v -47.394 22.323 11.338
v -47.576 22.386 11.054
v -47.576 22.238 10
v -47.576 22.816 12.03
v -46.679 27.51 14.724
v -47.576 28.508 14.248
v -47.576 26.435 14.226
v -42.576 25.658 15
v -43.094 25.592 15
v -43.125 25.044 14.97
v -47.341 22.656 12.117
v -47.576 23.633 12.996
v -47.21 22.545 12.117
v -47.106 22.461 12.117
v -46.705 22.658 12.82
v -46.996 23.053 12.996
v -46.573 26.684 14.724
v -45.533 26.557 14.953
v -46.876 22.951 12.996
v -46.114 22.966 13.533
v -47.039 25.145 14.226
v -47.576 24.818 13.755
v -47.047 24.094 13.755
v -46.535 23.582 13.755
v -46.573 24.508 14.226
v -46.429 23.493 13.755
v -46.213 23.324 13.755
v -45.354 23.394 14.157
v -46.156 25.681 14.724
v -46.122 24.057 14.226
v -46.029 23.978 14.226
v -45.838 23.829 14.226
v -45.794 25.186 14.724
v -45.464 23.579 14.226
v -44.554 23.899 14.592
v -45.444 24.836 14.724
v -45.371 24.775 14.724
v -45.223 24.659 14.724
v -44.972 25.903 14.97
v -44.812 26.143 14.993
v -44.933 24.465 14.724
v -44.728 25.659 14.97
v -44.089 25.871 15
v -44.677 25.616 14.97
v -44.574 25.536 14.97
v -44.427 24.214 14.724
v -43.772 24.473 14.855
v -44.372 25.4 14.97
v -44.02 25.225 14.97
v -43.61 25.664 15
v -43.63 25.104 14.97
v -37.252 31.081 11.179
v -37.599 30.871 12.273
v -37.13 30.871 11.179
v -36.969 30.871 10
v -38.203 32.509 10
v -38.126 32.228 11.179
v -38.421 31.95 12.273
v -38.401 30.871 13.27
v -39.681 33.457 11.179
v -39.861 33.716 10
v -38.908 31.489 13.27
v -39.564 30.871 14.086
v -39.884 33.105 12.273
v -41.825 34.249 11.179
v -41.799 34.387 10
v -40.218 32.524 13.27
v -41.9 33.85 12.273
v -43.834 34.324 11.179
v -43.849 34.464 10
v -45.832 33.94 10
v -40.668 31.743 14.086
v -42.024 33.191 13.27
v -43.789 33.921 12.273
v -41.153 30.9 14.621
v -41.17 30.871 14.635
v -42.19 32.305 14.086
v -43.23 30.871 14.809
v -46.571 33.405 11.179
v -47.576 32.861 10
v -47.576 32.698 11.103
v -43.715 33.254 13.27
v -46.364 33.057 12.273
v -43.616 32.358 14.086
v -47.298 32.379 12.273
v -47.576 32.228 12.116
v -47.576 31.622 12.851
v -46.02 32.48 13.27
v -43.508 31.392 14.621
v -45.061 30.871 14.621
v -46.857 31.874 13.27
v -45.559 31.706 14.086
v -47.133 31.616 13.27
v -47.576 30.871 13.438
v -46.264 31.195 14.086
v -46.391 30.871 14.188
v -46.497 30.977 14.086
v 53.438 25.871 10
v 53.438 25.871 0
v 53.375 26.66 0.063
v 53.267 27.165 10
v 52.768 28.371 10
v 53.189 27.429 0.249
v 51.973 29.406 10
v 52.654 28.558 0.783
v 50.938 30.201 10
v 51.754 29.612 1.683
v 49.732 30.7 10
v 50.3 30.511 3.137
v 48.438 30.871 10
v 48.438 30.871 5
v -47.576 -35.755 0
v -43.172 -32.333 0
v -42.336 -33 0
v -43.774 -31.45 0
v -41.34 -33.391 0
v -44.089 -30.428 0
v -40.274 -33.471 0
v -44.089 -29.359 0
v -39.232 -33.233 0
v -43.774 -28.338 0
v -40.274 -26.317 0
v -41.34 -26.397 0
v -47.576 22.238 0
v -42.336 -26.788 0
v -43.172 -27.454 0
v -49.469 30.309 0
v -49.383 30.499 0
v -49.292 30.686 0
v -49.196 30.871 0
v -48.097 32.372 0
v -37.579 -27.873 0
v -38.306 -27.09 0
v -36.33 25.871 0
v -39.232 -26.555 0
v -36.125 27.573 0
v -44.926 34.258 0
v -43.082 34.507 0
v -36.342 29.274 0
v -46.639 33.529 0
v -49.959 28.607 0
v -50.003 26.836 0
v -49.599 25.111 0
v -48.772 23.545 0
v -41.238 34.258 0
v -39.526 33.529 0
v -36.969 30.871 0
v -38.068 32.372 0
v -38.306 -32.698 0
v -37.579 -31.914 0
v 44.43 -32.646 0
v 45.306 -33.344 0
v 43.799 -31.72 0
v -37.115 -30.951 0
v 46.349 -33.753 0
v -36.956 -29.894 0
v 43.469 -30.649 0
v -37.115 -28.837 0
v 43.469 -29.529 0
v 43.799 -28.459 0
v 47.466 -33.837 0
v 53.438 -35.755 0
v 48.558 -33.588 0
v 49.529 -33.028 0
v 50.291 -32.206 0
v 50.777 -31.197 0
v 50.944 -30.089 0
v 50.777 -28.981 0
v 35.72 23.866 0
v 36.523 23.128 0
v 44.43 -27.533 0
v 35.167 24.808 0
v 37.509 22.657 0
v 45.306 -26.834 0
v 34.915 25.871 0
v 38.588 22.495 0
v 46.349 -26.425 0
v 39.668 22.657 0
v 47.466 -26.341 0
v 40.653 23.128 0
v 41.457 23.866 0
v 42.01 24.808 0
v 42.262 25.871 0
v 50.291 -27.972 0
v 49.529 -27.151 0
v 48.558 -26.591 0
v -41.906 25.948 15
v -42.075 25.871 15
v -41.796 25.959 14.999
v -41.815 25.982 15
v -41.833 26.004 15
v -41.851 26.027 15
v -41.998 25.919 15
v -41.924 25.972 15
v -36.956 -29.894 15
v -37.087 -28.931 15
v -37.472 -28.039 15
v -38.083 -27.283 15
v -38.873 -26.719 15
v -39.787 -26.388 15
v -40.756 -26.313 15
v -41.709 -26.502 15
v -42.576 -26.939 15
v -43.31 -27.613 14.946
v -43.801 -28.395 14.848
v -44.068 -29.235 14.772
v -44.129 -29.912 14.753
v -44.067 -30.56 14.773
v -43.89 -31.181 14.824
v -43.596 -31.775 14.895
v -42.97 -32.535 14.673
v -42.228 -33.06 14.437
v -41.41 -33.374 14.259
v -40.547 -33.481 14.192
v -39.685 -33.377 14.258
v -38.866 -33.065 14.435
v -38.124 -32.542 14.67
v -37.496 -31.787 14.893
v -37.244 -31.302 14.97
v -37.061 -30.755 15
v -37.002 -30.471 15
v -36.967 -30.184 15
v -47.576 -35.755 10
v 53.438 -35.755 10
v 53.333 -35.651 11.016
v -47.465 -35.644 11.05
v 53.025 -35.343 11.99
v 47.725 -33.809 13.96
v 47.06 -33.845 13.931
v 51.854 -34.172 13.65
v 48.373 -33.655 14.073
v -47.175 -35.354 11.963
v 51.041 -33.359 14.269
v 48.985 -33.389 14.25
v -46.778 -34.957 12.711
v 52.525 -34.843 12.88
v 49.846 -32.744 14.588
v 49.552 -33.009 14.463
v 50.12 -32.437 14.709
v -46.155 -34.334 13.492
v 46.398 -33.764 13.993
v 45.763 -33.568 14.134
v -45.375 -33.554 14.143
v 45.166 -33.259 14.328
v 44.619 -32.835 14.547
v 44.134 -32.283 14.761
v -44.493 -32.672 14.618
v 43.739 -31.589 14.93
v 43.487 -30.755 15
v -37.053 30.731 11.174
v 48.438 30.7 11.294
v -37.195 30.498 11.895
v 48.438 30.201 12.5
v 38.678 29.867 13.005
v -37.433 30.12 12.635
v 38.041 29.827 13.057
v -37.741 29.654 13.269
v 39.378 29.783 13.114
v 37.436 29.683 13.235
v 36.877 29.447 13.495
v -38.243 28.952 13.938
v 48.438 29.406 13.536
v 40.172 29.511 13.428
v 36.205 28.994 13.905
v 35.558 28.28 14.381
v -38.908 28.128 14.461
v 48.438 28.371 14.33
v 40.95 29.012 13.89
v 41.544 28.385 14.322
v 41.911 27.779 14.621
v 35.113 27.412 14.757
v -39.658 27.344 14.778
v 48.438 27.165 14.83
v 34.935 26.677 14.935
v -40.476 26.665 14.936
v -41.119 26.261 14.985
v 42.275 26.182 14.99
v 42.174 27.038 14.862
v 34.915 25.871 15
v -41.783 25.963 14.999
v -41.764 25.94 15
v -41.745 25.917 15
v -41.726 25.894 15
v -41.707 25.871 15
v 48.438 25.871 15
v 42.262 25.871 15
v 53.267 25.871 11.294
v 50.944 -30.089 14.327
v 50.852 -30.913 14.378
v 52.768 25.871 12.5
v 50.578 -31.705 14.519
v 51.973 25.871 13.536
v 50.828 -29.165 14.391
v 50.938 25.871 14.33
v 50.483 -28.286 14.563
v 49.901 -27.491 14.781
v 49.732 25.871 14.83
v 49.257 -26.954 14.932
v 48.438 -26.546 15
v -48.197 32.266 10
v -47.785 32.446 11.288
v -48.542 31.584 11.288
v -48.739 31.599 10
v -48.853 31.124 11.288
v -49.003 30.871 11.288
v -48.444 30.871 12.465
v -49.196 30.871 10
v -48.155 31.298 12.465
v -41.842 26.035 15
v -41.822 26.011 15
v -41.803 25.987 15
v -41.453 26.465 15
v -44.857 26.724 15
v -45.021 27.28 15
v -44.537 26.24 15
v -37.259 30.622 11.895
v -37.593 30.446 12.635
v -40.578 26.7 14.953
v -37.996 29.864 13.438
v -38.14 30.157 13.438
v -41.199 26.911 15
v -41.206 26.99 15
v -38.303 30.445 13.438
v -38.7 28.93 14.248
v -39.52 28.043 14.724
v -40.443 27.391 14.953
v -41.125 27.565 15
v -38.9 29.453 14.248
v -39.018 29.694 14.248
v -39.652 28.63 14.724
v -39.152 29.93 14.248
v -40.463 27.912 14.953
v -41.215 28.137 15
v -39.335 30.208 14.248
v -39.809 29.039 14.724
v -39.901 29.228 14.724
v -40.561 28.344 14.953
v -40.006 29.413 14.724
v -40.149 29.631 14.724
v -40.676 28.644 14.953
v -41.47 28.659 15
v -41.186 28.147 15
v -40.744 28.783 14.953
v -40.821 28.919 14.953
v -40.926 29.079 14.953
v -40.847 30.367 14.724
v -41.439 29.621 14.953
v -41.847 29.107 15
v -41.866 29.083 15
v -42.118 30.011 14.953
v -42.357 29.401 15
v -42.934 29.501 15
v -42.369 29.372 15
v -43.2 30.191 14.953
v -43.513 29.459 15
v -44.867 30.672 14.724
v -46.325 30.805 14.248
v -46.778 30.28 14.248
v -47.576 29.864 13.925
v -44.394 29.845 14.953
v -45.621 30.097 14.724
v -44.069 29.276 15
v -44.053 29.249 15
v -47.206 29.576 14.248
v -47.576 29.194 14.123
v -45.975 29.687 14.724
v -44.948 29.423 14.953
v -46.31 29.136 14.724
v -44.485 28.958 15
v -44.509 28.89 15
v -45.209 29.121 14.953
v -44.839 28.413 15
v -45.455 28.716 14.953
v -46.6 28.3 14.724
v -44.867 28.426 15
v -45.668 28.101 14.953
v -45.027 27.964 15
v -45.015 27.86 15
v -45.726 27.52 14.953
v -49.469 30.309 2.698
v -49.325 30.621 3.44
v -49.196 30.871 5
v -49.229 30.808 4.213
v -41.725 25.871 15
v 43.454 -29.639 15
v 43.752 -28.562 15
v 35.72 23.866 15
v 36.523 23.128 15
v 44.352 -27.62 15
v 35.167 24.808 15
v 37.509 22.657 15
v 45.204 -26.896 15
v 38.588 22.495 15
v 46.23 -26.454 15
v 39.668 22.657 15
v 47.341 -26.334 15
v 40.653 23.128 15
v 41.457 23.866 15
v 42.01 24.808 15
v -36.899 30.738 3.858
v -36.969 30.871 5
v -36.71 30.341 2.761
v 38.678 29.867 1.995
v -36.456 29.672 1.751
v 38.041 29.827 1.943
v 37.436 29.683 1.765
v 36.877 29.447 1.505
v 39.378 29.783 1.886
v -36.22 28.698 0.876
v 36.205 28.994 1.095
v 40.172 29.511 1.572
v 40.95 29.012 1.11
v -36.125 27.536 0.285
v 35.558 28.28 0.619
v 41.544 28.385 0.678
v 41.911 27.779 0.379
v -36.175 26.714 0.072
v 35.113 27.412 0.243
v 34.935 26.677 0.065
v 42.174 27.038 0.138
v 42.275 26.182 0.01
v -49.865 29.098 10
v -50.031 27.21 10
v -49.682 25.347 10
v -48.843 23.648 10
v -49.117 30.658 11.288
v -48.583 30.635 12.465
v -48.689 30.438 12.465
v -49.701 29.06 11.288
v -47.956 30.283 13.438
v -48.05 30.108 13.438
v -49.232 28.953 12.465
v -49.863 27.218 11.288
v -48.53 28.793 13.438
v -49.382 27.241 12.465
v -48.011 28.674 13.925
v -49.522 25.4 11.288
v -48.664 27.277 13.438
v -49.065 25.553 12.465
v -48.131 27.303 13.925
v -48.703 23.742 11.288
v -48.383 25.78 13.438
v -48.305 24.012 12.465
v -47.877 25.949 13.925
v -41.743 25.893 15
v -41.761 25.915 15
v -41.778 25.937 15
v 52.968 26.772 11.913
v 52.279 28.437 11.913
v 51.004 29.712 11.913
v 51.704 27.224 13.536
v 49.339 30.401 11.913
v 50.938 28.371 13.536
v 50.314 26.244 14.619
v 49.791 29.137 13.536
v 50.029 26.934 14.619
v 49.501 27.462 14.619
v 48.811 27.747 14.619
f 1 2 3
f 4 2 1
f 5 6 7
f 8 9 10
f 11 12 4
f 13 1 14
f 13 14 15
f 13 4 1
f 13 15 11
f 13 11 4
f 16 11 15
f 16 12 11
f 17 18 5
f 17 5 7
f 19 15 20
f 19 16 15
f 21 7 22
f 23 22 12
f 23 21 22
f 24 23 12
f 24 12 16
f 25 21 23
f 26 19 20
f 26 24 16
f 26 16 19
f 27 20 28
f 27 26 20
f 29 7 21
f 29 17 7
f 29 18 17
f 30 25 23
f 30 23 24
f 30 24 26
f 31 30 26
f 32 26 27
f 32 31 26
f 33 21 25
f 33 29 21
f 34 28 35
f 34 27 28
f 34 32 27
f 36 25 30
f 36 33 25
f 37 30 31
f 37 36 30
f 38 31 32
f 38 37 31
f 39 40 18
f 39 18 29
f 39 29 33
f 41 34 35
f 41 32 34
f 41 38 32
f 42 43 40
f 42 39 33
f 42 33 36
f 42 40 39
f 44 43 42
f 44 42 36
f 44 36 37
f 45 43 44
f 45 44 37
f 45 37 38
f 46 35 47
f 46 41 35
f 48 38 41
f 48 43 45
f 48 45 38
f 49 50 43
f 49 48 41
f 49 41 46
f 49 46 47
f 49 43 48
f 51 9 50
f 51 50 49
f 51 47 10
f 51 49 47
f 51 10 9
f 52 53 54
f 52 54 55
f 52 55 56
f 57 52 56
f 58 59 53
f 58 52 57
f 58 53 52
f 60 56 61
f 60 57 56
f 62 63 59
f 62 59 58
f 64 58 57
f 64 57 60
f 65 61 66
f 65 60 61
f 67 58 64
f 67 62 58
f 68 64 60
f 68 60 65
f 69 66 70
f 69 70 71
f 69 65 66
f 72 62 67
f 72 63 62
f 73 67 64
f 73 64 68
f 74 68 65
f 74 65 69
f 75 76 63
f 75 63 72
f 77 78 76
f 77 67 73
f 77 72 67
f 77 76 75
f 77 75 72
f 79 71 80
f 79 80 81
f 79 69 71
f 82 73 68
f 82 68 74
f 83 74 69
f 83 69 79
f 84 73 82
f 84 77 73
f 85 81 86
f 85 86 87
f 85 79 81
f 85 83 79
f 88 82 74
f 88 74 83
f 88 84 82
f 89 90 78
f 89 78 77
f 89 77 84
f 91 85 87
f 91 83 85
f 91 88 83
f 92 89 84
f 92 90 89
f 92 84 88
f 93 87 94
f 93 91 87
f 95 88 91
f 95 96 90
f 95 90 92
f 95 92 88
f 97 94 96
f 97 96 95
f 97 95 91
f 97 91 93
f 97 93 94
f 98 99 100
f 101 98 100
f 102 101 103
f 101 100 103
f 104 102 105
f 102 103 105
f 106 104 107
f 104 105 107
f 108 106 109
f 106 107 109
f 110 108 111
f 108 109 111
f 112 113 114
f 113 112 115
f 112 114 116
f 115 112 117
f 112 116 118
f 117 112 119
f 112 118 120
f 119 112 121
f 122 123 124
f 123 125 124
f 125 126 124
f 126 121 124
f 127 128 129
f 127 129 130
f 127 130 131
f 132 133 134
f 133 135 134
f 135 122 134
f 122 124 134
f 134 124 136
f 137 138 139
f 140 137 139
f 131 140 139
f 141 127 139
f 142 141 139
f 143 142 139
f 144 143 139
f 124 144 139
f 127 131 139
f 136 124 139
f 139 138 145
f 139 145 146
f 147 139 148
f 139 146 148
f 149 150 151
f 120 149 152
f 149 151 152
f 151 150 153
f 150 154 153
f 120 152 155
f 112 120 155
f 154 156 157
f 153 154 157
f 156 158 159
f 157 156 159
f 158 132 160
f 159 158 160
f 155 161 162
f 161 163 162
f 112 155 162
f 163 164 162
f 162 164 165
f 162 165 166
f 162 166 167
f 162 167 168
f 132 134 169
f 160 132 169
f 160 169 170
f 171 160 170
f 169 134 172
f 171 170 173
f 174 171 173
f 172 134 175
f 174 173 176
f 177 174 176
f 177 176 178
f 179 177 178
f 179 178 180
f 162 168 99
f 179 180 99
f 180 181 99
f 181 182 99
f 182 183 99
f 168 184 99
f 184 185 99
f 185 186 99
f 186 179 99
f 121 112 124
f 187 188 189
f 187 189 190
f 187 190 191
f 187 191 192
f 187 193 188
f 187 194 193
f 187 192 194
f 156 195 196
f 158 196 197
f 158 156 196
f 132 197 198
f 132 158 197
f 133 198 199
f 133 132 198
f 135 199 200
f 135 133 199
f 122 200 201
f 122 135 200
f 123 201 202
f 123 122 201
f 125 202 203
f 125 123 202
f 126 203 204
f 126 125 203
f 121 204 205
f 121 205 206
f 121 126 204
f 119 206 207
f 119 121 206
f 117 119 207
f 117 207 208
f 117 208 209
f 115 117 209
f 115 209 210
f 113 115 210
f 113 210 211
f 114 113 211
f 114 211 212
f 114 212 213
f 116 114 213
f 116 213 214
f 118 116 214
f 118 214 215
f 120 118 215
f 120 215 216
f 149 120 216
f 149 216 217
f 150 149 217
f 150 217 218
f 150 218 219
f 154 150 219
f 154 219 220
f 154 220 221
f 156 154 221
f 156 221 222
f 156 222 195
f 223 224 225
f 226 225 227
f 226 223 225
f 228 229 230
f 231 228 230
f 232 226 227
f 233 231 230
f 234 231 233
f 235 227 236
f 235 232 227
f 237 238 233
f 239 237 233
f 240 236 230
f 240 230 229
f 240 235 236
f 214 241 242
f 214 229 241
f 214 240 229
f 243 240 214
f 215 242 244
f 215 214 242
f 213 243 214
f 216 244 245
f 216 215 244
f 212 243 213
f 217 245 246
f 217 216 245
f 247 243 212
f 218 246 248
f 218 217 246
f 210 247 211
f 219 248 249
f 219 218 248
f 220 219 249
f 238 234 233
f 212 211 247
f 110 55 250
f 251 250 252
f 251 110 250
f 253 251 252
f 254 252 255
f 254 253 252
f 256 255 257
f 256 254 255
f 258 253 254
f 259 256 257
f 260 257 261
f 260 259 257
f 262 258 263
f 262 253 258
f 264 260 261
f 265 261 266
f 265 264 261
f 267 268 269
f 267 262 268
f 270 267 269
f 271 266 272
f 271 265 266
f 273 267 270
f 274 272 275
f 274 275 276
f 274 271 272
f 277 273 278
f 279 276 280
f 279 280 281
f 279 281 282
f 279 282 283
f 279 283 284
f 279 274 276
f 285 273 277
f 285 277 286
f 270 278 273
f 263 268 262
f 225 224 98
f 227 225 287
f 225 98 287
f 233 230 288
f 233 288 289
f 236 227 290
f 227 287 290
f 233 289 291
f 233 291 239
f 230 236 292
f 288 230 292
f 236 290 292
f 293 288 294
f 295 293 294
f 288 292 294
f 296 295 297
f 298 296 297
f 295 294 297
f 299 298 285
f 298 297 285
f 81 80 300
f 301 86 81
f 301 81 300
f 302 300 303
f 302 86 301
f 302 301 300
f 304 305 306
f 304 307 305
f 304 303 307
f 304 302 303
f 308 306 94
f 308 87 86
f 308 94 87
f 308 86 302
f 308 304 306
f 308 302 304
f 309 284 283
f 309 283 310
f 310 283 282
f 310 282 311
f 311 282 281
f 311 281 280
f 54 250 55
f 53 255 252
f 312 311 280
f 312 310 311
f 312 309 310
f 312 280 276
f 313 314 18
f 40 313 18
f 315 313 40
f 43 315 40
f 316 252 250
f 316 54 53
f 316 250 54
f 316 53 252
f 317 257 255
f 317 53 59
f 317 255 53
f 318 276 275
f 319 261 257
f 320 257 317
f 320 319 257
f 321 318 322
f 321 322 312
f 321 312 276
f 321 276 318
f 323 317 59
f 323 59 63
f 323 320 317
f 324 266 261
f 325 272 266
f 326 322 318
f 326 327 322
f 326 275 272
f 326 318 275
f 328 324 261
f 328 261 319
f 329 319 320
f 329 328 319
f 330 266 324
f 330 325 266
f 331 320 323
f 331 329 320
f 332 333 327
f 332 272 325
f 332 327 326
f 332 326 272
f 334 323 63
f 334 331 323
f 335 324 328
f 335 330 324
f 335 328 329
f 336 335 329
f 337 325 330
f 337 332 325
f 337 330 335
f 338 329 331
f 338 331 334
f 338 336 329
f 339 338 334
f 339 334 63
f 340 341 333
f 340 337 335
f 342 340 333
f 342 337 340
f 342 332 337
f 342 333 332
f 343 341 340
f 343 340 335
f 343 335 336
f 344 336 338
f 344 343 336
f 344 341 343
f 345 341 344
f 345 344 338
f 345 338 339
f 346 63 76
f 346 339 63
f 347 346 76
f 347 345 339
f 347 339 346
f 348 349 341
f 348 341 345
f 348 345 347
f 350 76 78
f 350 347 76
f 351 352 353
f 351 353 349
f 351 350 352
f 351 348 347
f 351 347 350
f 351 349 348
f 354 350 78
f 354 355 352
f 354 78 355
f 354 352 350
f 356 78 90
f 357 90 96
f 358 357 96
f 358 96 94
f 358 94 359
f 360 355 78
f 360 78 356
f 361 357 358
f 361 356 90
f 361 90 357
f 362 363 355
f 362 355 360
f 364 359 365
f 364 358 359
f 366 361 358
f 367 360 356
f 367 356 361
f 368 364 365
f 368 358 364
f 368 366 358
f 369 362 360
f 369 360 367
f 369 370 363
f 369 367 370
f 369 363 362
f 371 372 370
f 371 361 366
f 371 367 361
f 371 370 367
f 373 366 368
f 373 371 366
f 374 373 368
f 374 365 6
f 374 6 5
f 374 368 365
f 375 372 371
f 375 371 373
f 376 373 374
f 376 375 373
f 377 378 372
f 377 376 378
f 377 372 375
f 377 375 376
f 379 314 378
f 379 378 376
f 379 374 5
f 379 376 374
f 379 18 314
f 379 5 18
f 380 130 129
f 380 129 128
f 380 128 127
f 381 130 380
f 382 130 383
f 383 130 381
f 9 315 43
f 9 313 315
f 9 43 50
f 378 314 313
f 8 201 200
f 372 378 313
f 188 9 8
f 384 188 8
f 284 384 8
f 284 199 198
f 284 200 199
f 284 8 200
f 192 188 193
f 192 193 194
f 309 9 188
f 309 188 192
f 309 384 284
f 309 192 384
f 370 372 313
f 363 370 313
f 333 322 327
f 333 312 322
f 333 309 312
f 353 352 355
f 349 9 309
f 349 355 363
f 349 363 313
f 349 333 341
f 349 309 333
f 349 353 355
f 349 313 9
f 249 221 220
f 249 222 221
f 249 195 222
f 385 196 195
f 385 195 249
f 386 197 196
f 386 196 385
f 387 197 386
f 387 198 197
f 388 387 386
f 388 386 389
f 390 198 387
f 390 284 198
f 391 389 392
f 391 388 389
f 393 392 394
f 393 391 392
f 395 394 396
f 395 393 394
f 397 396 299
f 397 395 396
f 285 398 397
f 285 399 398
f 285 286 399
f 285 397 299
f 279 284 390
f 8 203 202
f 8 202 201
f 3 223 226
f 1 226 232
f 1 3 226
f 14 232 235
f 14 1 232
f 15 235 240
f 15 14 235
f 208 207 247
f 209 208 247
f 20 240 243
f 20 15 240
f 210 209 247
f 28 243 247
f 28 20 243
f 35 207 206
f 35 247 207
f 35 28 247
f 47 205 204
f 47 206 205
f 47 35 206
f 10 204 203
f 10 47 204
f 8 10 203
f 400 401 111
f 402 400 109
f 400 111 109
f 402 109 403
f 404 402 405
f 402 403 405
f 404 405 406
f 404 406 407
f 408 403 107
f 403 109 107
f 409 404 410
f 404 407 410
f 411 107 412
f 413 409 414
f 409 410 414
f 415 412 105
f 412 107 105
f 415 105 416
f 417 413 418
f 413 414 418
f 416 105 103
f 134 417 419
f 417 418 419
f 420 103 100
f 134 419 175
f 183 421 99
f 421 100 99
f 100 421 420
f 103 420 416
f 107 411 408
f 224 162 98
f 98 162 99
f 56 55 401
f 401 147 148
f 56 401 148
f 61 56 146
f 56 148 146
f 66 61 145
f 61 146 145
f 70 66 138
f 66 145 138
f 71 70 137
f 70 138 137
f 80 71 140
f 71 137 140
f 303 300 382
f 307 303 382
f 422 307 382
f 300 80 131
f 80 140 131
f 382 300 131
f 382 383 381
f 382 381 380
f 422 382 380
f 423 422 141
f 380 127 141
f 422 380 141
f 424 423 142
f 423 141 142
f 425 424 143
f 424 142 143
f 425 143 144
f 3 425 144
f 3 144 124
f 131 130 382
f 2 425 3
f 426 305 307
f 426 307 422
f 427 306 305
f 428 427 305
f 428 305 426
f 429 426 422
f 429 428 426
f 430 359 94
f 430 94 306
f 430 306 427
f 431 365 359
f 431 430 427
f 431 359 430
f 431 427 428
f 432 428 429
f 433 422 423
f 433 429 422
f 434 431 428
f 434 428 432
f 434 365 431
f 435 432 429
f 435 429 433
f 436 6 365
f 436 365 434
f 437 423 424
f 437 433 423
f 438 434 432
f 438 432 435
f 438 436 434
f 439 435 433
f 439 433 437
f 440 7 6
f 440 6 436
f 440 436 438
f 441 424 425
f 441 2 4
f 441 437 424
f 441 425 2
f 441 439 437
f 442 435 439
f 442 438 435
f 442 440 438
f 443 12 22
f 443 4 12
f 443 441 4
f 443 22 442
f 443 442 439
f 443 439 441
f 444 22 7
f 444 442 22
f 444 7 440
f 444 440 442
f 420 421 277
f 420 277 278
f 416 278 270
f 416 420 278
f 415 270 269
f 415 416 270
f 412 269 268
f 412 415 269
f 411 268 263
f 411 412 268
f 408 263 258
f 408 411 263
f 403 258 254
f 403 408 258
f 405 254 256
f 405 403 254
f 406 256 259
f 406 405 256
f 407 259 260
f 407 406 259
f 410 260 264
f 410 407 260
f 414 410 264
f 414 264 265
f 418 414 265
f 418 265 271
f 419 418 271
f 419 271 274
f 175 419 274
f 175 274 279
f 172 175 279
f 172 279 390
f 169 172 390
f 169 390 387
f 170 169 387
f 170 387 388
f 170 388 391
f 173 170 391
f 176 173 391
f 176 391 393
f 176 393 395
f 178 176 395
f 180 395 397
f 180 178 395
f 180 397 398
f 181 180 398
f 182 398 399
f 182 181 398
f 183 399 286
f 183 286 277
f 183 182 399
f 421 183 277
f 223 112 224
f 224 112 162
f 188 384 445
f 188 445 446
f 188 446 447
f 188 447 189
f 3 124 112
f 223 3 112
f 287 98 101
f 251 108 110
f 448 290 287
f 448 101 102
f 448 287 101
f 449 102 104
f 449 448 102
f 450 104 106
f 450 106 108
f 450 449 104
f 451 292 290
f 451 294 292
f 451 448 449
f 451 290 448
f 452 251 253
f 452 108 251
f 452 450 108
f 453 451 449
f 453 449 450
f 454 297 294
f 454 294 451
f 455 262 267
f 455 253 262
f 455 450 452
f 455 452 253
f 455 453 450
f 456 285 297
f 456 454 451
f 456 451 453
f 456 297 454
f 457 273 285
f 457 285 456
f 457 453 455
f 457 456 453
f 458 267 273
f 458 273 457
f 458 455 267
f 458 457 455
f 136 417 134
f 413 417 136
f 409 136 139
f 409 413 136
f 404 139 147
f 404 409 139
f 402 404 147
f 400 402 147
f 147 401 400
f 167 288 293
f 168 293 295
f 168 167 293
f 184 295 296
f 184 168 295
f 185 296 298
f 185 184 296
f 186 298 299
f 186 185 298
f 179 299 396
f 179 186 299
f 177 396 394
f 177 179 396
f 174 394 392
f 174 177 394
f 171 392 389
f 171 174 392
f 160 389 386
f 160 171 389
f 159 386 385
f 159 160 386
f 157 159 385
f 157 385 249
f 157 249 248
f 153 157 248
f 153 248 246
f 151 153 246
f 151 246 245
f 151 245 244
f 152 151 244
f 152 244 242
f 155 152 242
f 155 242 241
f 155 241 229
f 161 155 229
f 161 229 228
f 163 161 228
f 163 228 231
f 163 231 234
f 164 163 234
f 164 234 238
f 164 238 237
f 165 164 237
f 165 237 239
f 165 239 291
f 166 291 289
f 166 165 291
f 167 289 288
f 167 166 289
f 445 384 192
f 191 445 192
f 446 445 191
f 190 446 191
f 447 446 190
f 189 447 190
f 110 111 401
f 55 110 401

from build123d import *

# Parameters (mm, degrees)
F0_R         = 3.586786404
F0_R_2       = 3.7582992631
F0_R_3       = 3.6865102679
F1_DEPTH     = 15
F2_T1_DEPTH  = 126.0138504207
F2_T3_DEPTH  = 22.5
F2_T5_DEPTH  = 74.126155749
F2_S9_W      = 5
F2_S9_H      = 5
F2_T10_DEPTH = 5
F2_T16_DEPTH = 97.9066217834
F2_S17_R     = 6.9574459714
F2_T18_DEPTH = 51
F2_T22_DEPTH = 82.9931766736
F2_S23_R     = 6.9574459714
F2_T24_DEPTH = 43
F2_T28_ANGLE = 359.64
F2_T34_ANGLE = 359.64
F2_T40_ANGLE = 359.64
F2_T46_DEPTH = 115.4066217834
F2_S47_R     = 6.9574459714
F2_T48_DEPTH = 59
F2_T53_ANGLE = 359.64
F2_T58_DEPTH = 97.9066217834
F2_S59_R     = 6.9574459714
F2_T60_DEPTH = 51
F2_T66_ANGLE = 359.64
F2_T71_DEPTH = 82.9931766736
F2_S72_R     = 6.9574459714
F2_T73_DEPTH = 43


# Not quite as in the source:
# - a fillet or chamfer that OpenCascade refuses, or shapes differently, is made with other operations: its cross-section is extruded or revolved along the edge and cut away or added


with BuildPart() as f1:
    # F0 (on Top) → F1 (new body)
    with BuildSketch(Plane.XY):
        with BuildLine():
            Line((-47.5761555135, 22.2377919602), (-47.5761555135, 30.8707710356))
            Line((-47.5761555135, 30.8707710356), (-36.9689268762, 30.8707710356))
            ThreePointArc((-36.9689268762, 30.8707710356), (-47.4740962985, 32.9453643179), (-47.5761555135, 22.2377919602))
        make_face()
        with BuildLine():
            Line((-36.9689268762, 30.8707710356), (-47.5761555135, 30.8707710356))
            Line((-47.5761555135, 30.8707710356), (-47.5761555135, 22.2377919602))
            ThreePointArc((-47.5761555135, 22.2377919602), (-40.1548216165, 21.2376644422), (-36.1248620528, 27.5492314249))
            ThreePointArc((-36.1248620528, 27.5492314249), (-36.3391791701, 29.2627855393), (-36.9689268762, 30.8707710356))
        make_face()
        with BuildLine():
            Line((53.4376949072, 30.8707710356), (-36.9689268762, 30.8707710356))
            ThreePointArc((-36.9689268762, 30.8707710356), (-36.3391791701, 29.2627855393), (-36.1248620528, 27.5492314249))
            ThreePointArc((-36.1248620528, 27.5492314249), (-40.1548216165, 21.2376644422), (-47.5761555135, 22.2377919602))
            Line((-47.5761555135, 22.2377919602), (-47.5761555135, -35.7553847134))
            Line((-47.5761555135, -35.7553847134), (53.4376949072, -35.7553847134))
            Line((53.4376949072, -35.7553847134), (53.4376949072, 30.8707710356))
        make_face()
        with Locations((-40.5423082411, -29.8938471824)):
            Circle(F0_R, mode=Mode.SUBTRACT)
        with Locations((47.1853874624, -30.089231208)):
            Circle(F0_R_2, mode=Mode.SUBTRACT)
        with Locations((38.5884605348, 26.1815395206)):
            Circle(F0_R_3, mode=Mode.SUBTRACT)
    extrude(amount=F1_DEPTH)

    # F2: fillet of radius 5 on 7 edges, made by hand

    # F2_s2 → F2_t1 (cut)
    with BuildSketch(Plane.YZ.offset(-60.0761555135)):
        with BuildLine():
            ThreePointArc((-35.7553847134, 10), (-34.2909186193, 13.5355339059), (-30.7553847134, 15))
            Line((-30.7553847134, 15), (-35.7553847134, 15))
            Line((-35.7553847134, 15), (-35.7553847134, 10))
        make_face()
    extrude(amount=F2_T1_DEPTH, mode=Mode.SUBTRACT)

    # F2_s4 → F2_t3 (cut)
    with BuildSketch(Plane.XY.offset(-12.5)):
        with BuildLine():
            ThreePointArc((53.4376949072, 25.8707710356), (51.9732288131, 29.4063049415), (48.4376949072, 30.8707710356))
            Line((48.4376949072, 30.8707710356), (53.4376949072, 30.8707710356))
            Line((53.4376949072, 30.8707710356), (53.4376949072, 25.8707710356))
        make_face()
    extrude(amount=F2_T3_DEPTH, mode=Mode.SUBTRACT)

    # F2_s6 → F2_t5 (cut)
    with BuildSketch(Plane.XZ.offset(-25.8707710356)):
        with BuildLine():
            ThreePointArc((53.4376949072, 10), (51.9732288131, 13.5355339059), (48.4376949072, 15))
            Line((48.4376949072, 15), (53.4376949072, 15))
            Line((53.4376949072, 15), (53.4376949072, 10))
        make_face()
    extrude(amount=F2_T5_DEPTH, mode=Mode.SUBTRACT)


with BuildPart() as f2_tool8:
    # F2_s9 → F2_t10 (new body)
    with BuildSketch(Plane.XY.offset(10)):
        with Locations((50.9376949072, 28.3707710356)):
            Rectangle(F2_S9_W, F2_S9_H)
    extrude(amount=F2_T10_DEPTH)

    # F2_s11 → F2_t12 (revolve, cut)
    with BuildSketch(Plane(origin=(48.4376949072, 25.8707710356, 10), x_dir=(-0.7071067812, -0.7071067812, 0), z_dir=(-0.7071067812, 0.7071067812, 0))):
        with BuildLine():
            ThreePointArc((0, -5), (5, 0), (0, 5))
            Line((0, 5), (0, -5))
        make_face()
    revolve(axis=Axis((48.4376949072, 25.8707710356, 10), (0, 0, 1)), mode=Mode.SUBTRACT)


with BuildPart() as f1_1:
    add(f1.part)

    # F2_t7: cut F2_tool8
    add(f2_tool8.part, mode=Mode.SUBTRACT)


with BuildPart() as f2_tool14:
    # F2_s15 → F2_t16 (new body)
    with BuildSketch(Plane.YZ.offset(48.4376949072)):
        with BuildLine():
            ThreePointArc((30.8707710356, 10), (29.4063049415, 13.5355339059), (25.8707710356, 15))
            Line((25.8707710356, 15), (30.8707710356, 15))
            Line((30.8707710356, 15), (30.8707710356, 10))
        make_face()
    extrude(amount=-F2_T16_DEPTH)

    # F2_s17 → F2_t18 (cut, symmetric)
    with BuildSketch(Plane.XY.offset(12.5)):
        with Locations((-43.0823080242, 27.5492314249)):
            Circle(F2_S17_R)
    extrude(amount=F2_T18_DEPTH, both=True, mode=Mode.SUBTRACT)


with BuildPart() as f1_2:
    add(f1_1.part)

    # F2_t13: cut F2_tool14
    add(f2_tool14.part, mode=Mode.SUBTRACT)


with BuildPart() as f2_tool20:
    # F2_s21 → F2_t22 (new body)
    with BuildSketch(Plane.XZ.offset(-34.7377919602)):
        with BuildLine():
            ThreePointArc((-47.5761555135, 10), (-46.1116894195, 13.5355339059), (-42.5761555135, 15))
            Line((-42.5761555135, 15), (-47.5761555135, 15))
            Line((-47.5761555135, 15), (-47.5761555135, 10))
        make_face()
    extrude(amount=F2_T22_DEPTH)

    # F2_s23 → F2_t24 (cut, symmetric)
    with BuildSketch(Plane.XY.offset(12.5)):
        with Locations((-43.0823080242, 27.5492314249)):
            Circle(F2_S23_R)
    extrude(amount=F2_T24_DEPTH, both=True, mode=Mode.SUBTRACT)


with BuildPart() as f1_3:
    add(f1_2.part)

    # F2_t19: cut F2_tool20
    add(f2_tool20.part, mode=Mode.SUBTRACT)


with BuildPart() as f2_tool26:
    # F2_s27 → F2_t28 (revolve)
    with BuildSketch(Plane(origin=(-12.2782997509, -10.0573142374, 0), x_dir=(0, 0, 1), z_dir=(-0.77360415, -0.6336691716, 0))):
        with BuildLine():
            ThreePointArc((10, 41.6546842262), (13.5355339059, 43.1191503203), (15, 46.6546842262))
            Line((15, 46.6546842262), (15, 41.6546842262))
            Line((15, 41.6546842262), (10, 41.6546842262))
        make_face()
    revolve(axis=Axis((-43.0823080242, 27.5492314249, 15), (0, 0, 1)), revolution_arc=F2_T28_ANGLE)

    split(bisect_by=Plane.XZ.offset(-30.8707710356), keep=Keep.TOP)

    split(bisect_by=Plane.YZ.offset(-47.5761555135), keep=Keep.BOTTOM)


with BuildPart() as f1_4:
    add(f1_3.part)

    # F2_t25: cut F2_tool26
    add(f2_tool26.part, mode=Mode.SUBTRACT)


with BuildPart() as f2_tool32:
    # F2_s33 → F2_t34 (revolve)
    with BuildSketch(Plane(origin=(-12.2782997509, -10.0573142374, 0), x_dir=(0, 0, 1), z_dir=(-0.77360415, -0.6336691716, 0))):
        with BuildLine():
            ThreePointArc((10, 41.6546842262), (13.5355339059, 43.1191503203), (15, 46.6546842262))
            Line((15, 46.6546842262), (15, 41.6546842262))
            Line((15, 41.6546842262), (10, 41.6546842262))
        make_face()
    revolve(axis=Axis((-43.0823080242, 27.5492314249, 15), (0, 0, 1)), revolution_arc=F2_T34_ANGLE)

    split(bisect_by=Plane.XZ.offset(-30.8707710356), keep=Keep.BOTTOM)

    split(bisect_by=Plane.YZ.offset(-47.5761555135), keep=Keep.TOP)


with BuildPart() as f1_5:
    add(f1_4.part)

    # F2_t31: cut F2_tool32
    add(f2_tool32.part, mode=Mode.SUBTRACT)


with BuildPart() as f2_tool38:
    # F2_s39 → F2_t40 (revolve)
    with BuildSketch(Plane(origin=(-12.2782997509, -10.0573142374, 0), x_dir=(0, 0, 1), z_dir=(-0.77360415, -0.6336691716, 0))):
        with BuildLine():
            ThreePointArc((10, 41.6546842262), (13.5355339059, 43.1191503203), (15, 46.6546842262))
            Line((15, 46.6546842262), (15, 41.6546842262))
            Line((15, 41.6546842262), (10, 41.6546842262))
        make_face()
    revolve(axis=Axis((-43.0823080242, 27.5492314249, 15), (0, 0, 1)), revolution_arc=F2_T40_ANGLE)

    split(bisect_by=Plane.XZ.offset(-30.8707710356), keep=Keep.BOTTOM)

    split(bisect_by=Plane.YZ.offset(-47.5761555135), keep=Keep.BOTTOM)


with BuildPart() as f1_6:
    add(f1_5.part)

    # F2_t37: cut F2_tool38
    add(f2_tool38.part, mode=Mode.SUBTRACT)


with BuildPart() as f2_tool44:
    # F2_s45 → F2_t46 (new body)
    with BuildSketch(Plane.YZ.offset(65.9376949072)):
        with BuildLine():
            ThreePointArc((30.8707710356, 5), (29.4063049415, 1.4644660941), (25.8707710356, 0))
            Line((25.8707710356, 0), (30.8707710356, 0))
            Line((30.8707710356, 0), (30.8707710356, 5))
        make_face()
    extrude(amount=-F2_T46_DEPTH)

    # F2_s47 → F2_t48 (cut, symmetric)
    with BuildSketch(Plane.XY.offset(2.5)):
        with Locations((-43.0823080242, 27.5492314249)):
            Circle(F2_S47_R)
    extrude(amount=F2_T48_DEPTH, both=True, mode=Mode.SUBTRACT)


with BuildPart() as f1_7:
    add(f1_6.part)

    # F2_t43: cut F2_tool44
    add(f2_tool44.part, mode=Mode.SUBTRACT)


with BuildPart() as f2_tool51:
    # F2_s52 → F2_t53 (revolve)
    with BuildSketch(Plane(origin=(-12.2782997509, -10.0573142374, 0), x_dir=(0, 0, 1), z_dir=(-0.77360415, -0.6336691716, 0))):
        with BuildLine():
            ThreePointArc((10, 41.6546842262), (13.5355339059, 43.1191503203), (15, 46.6546842262))
            Line((15, 46.6546842262), (15, 41.6546842262))
            Line((15, 41.6546842262), (10, 41.6546842262))
        make_face()
    revolve(axis=Axis((-43.0823080242, 27.5492314249, 15), (0, 0, 1)), revolution_arc=F2_T53_ANGLE)

    split(bisect_by=Plane.XZ.offset(-30.8707710356), keep=Keep.TOP)

    split(bisect_by=Plane.YZ.offset(-47.5761555135), keep=Keep.TOP)


with BuildPart() as f2_tool56:
    # F2_s57 → F2_t58 (new body)
    with BuildSketch(Plane.YZ.offset(48.4376949072)):
        with BuildLine():
            ThreePointArc((30.8707710356, 10), (29.4063049415, 13.5355339059), (25.8707710356, 15))
            Line((25.8707710356, 15), (30.8707710356, 15))
            Line((30.8707710356, 15), (30.8707710356, 10))
        make_face()
    extrude(amount=-F2_T58_DEPTH)

    # F2_s59 → F2_t60 (intersect, symmetric)
    with BuildSketch(Plane.XY.offset(12.5)):
        with Locations((-43.0823080242, 27.5492314249)):
            Circle(F2_S59_R)
    extrude(amount=F2_T60_DEPTH, both=True, mode=Mode.INTERSECT)


with BuildPart() as f2_tool51_1:
    add(f2_tool51.part)

    # F2_t61: intersect F2_tool56
    add(f2_tool56.part, mode=Mode.INTERSECT)


with BuildPart() as f1_8:
    add(f1_7.part)

    # F2_t49: cut F2_tool51
    add(f2_tool51_1.part, mode=Mode.SUBTRACT)


with BuildPart() as f2_tool64:
    # F2_s65 → F2_t66 (revolve)
    with BuildSketch(Plane(origin=(-12.2782997509, -10.0573142374, 0), x_dir=(0, 0, 1), z_dir=(-0.77360415, -0.6336691716, 0))):
        with BuildLine():
            ThreePointArc((10, 41.6546842262), (13.5355339059, 43.1191503203), (15, 46.6546842262))
            Line((15, 46.6546842262), (15, 41.6546842262))
            Line((15, 41.6546842262), (10, 41.6546842262))
        make_face()
    revolve(axis=Axis((-43.0823080242, 27.5492314249, 15), (0, 0, 1)), revolution_arc=F2_T66_ANGLE)

    split(bisect_by=Plane.XZ.offset(-30.8707710356), keep=Keep.TOP)

    split(bisect_by=Plane.YZ.offset(-47.5761555135), keep=Keep.TOP)


with BuildPart() as f2_tool69:
    # F2_s70 → F2_t71 (new body)
    with BuildSketch(Plane.XZ.offset(-34.7377919602)):
        with BuildLine():
            ThreePointArc((-47.5761555135, 10), (-46.1116894195, 13.5355339059), (-42.5761555135, 15))
            Line((-42.5761555135, 15), (-47.5761555135, 15))
            Line((-47.5761555135, 15), (-47.5761555135, 10))
        make_face()
    extrude(amount=F2_T71_DEPTH)

    # F2_s72 → F2_t73 (intersect, symmetric)
    with BuildSketch(Plane.XY.offset(12.5)):
        with Locations((-43.0823080242, 27.5492314249)):
            Circle(F2_S72_R)
    extrude(amount=F2_T73_DEPTH, both=True, mode=Mode.INTERSECT)


with BuildPart() as f2_tool64_1:
    add(f2_tool64.part)

    # F2_t74: intersect F2_tool69
    add(f2_tool69.part, mode=Mode.INTERSECT)


with BuildPart() as f1_9:
    add(f1_8.part)

    # F2_t62: cut F2_tool64
    add(f2_tool64_1.part, mode=Mode.SUBTRACT)


solid = f1_9.part
